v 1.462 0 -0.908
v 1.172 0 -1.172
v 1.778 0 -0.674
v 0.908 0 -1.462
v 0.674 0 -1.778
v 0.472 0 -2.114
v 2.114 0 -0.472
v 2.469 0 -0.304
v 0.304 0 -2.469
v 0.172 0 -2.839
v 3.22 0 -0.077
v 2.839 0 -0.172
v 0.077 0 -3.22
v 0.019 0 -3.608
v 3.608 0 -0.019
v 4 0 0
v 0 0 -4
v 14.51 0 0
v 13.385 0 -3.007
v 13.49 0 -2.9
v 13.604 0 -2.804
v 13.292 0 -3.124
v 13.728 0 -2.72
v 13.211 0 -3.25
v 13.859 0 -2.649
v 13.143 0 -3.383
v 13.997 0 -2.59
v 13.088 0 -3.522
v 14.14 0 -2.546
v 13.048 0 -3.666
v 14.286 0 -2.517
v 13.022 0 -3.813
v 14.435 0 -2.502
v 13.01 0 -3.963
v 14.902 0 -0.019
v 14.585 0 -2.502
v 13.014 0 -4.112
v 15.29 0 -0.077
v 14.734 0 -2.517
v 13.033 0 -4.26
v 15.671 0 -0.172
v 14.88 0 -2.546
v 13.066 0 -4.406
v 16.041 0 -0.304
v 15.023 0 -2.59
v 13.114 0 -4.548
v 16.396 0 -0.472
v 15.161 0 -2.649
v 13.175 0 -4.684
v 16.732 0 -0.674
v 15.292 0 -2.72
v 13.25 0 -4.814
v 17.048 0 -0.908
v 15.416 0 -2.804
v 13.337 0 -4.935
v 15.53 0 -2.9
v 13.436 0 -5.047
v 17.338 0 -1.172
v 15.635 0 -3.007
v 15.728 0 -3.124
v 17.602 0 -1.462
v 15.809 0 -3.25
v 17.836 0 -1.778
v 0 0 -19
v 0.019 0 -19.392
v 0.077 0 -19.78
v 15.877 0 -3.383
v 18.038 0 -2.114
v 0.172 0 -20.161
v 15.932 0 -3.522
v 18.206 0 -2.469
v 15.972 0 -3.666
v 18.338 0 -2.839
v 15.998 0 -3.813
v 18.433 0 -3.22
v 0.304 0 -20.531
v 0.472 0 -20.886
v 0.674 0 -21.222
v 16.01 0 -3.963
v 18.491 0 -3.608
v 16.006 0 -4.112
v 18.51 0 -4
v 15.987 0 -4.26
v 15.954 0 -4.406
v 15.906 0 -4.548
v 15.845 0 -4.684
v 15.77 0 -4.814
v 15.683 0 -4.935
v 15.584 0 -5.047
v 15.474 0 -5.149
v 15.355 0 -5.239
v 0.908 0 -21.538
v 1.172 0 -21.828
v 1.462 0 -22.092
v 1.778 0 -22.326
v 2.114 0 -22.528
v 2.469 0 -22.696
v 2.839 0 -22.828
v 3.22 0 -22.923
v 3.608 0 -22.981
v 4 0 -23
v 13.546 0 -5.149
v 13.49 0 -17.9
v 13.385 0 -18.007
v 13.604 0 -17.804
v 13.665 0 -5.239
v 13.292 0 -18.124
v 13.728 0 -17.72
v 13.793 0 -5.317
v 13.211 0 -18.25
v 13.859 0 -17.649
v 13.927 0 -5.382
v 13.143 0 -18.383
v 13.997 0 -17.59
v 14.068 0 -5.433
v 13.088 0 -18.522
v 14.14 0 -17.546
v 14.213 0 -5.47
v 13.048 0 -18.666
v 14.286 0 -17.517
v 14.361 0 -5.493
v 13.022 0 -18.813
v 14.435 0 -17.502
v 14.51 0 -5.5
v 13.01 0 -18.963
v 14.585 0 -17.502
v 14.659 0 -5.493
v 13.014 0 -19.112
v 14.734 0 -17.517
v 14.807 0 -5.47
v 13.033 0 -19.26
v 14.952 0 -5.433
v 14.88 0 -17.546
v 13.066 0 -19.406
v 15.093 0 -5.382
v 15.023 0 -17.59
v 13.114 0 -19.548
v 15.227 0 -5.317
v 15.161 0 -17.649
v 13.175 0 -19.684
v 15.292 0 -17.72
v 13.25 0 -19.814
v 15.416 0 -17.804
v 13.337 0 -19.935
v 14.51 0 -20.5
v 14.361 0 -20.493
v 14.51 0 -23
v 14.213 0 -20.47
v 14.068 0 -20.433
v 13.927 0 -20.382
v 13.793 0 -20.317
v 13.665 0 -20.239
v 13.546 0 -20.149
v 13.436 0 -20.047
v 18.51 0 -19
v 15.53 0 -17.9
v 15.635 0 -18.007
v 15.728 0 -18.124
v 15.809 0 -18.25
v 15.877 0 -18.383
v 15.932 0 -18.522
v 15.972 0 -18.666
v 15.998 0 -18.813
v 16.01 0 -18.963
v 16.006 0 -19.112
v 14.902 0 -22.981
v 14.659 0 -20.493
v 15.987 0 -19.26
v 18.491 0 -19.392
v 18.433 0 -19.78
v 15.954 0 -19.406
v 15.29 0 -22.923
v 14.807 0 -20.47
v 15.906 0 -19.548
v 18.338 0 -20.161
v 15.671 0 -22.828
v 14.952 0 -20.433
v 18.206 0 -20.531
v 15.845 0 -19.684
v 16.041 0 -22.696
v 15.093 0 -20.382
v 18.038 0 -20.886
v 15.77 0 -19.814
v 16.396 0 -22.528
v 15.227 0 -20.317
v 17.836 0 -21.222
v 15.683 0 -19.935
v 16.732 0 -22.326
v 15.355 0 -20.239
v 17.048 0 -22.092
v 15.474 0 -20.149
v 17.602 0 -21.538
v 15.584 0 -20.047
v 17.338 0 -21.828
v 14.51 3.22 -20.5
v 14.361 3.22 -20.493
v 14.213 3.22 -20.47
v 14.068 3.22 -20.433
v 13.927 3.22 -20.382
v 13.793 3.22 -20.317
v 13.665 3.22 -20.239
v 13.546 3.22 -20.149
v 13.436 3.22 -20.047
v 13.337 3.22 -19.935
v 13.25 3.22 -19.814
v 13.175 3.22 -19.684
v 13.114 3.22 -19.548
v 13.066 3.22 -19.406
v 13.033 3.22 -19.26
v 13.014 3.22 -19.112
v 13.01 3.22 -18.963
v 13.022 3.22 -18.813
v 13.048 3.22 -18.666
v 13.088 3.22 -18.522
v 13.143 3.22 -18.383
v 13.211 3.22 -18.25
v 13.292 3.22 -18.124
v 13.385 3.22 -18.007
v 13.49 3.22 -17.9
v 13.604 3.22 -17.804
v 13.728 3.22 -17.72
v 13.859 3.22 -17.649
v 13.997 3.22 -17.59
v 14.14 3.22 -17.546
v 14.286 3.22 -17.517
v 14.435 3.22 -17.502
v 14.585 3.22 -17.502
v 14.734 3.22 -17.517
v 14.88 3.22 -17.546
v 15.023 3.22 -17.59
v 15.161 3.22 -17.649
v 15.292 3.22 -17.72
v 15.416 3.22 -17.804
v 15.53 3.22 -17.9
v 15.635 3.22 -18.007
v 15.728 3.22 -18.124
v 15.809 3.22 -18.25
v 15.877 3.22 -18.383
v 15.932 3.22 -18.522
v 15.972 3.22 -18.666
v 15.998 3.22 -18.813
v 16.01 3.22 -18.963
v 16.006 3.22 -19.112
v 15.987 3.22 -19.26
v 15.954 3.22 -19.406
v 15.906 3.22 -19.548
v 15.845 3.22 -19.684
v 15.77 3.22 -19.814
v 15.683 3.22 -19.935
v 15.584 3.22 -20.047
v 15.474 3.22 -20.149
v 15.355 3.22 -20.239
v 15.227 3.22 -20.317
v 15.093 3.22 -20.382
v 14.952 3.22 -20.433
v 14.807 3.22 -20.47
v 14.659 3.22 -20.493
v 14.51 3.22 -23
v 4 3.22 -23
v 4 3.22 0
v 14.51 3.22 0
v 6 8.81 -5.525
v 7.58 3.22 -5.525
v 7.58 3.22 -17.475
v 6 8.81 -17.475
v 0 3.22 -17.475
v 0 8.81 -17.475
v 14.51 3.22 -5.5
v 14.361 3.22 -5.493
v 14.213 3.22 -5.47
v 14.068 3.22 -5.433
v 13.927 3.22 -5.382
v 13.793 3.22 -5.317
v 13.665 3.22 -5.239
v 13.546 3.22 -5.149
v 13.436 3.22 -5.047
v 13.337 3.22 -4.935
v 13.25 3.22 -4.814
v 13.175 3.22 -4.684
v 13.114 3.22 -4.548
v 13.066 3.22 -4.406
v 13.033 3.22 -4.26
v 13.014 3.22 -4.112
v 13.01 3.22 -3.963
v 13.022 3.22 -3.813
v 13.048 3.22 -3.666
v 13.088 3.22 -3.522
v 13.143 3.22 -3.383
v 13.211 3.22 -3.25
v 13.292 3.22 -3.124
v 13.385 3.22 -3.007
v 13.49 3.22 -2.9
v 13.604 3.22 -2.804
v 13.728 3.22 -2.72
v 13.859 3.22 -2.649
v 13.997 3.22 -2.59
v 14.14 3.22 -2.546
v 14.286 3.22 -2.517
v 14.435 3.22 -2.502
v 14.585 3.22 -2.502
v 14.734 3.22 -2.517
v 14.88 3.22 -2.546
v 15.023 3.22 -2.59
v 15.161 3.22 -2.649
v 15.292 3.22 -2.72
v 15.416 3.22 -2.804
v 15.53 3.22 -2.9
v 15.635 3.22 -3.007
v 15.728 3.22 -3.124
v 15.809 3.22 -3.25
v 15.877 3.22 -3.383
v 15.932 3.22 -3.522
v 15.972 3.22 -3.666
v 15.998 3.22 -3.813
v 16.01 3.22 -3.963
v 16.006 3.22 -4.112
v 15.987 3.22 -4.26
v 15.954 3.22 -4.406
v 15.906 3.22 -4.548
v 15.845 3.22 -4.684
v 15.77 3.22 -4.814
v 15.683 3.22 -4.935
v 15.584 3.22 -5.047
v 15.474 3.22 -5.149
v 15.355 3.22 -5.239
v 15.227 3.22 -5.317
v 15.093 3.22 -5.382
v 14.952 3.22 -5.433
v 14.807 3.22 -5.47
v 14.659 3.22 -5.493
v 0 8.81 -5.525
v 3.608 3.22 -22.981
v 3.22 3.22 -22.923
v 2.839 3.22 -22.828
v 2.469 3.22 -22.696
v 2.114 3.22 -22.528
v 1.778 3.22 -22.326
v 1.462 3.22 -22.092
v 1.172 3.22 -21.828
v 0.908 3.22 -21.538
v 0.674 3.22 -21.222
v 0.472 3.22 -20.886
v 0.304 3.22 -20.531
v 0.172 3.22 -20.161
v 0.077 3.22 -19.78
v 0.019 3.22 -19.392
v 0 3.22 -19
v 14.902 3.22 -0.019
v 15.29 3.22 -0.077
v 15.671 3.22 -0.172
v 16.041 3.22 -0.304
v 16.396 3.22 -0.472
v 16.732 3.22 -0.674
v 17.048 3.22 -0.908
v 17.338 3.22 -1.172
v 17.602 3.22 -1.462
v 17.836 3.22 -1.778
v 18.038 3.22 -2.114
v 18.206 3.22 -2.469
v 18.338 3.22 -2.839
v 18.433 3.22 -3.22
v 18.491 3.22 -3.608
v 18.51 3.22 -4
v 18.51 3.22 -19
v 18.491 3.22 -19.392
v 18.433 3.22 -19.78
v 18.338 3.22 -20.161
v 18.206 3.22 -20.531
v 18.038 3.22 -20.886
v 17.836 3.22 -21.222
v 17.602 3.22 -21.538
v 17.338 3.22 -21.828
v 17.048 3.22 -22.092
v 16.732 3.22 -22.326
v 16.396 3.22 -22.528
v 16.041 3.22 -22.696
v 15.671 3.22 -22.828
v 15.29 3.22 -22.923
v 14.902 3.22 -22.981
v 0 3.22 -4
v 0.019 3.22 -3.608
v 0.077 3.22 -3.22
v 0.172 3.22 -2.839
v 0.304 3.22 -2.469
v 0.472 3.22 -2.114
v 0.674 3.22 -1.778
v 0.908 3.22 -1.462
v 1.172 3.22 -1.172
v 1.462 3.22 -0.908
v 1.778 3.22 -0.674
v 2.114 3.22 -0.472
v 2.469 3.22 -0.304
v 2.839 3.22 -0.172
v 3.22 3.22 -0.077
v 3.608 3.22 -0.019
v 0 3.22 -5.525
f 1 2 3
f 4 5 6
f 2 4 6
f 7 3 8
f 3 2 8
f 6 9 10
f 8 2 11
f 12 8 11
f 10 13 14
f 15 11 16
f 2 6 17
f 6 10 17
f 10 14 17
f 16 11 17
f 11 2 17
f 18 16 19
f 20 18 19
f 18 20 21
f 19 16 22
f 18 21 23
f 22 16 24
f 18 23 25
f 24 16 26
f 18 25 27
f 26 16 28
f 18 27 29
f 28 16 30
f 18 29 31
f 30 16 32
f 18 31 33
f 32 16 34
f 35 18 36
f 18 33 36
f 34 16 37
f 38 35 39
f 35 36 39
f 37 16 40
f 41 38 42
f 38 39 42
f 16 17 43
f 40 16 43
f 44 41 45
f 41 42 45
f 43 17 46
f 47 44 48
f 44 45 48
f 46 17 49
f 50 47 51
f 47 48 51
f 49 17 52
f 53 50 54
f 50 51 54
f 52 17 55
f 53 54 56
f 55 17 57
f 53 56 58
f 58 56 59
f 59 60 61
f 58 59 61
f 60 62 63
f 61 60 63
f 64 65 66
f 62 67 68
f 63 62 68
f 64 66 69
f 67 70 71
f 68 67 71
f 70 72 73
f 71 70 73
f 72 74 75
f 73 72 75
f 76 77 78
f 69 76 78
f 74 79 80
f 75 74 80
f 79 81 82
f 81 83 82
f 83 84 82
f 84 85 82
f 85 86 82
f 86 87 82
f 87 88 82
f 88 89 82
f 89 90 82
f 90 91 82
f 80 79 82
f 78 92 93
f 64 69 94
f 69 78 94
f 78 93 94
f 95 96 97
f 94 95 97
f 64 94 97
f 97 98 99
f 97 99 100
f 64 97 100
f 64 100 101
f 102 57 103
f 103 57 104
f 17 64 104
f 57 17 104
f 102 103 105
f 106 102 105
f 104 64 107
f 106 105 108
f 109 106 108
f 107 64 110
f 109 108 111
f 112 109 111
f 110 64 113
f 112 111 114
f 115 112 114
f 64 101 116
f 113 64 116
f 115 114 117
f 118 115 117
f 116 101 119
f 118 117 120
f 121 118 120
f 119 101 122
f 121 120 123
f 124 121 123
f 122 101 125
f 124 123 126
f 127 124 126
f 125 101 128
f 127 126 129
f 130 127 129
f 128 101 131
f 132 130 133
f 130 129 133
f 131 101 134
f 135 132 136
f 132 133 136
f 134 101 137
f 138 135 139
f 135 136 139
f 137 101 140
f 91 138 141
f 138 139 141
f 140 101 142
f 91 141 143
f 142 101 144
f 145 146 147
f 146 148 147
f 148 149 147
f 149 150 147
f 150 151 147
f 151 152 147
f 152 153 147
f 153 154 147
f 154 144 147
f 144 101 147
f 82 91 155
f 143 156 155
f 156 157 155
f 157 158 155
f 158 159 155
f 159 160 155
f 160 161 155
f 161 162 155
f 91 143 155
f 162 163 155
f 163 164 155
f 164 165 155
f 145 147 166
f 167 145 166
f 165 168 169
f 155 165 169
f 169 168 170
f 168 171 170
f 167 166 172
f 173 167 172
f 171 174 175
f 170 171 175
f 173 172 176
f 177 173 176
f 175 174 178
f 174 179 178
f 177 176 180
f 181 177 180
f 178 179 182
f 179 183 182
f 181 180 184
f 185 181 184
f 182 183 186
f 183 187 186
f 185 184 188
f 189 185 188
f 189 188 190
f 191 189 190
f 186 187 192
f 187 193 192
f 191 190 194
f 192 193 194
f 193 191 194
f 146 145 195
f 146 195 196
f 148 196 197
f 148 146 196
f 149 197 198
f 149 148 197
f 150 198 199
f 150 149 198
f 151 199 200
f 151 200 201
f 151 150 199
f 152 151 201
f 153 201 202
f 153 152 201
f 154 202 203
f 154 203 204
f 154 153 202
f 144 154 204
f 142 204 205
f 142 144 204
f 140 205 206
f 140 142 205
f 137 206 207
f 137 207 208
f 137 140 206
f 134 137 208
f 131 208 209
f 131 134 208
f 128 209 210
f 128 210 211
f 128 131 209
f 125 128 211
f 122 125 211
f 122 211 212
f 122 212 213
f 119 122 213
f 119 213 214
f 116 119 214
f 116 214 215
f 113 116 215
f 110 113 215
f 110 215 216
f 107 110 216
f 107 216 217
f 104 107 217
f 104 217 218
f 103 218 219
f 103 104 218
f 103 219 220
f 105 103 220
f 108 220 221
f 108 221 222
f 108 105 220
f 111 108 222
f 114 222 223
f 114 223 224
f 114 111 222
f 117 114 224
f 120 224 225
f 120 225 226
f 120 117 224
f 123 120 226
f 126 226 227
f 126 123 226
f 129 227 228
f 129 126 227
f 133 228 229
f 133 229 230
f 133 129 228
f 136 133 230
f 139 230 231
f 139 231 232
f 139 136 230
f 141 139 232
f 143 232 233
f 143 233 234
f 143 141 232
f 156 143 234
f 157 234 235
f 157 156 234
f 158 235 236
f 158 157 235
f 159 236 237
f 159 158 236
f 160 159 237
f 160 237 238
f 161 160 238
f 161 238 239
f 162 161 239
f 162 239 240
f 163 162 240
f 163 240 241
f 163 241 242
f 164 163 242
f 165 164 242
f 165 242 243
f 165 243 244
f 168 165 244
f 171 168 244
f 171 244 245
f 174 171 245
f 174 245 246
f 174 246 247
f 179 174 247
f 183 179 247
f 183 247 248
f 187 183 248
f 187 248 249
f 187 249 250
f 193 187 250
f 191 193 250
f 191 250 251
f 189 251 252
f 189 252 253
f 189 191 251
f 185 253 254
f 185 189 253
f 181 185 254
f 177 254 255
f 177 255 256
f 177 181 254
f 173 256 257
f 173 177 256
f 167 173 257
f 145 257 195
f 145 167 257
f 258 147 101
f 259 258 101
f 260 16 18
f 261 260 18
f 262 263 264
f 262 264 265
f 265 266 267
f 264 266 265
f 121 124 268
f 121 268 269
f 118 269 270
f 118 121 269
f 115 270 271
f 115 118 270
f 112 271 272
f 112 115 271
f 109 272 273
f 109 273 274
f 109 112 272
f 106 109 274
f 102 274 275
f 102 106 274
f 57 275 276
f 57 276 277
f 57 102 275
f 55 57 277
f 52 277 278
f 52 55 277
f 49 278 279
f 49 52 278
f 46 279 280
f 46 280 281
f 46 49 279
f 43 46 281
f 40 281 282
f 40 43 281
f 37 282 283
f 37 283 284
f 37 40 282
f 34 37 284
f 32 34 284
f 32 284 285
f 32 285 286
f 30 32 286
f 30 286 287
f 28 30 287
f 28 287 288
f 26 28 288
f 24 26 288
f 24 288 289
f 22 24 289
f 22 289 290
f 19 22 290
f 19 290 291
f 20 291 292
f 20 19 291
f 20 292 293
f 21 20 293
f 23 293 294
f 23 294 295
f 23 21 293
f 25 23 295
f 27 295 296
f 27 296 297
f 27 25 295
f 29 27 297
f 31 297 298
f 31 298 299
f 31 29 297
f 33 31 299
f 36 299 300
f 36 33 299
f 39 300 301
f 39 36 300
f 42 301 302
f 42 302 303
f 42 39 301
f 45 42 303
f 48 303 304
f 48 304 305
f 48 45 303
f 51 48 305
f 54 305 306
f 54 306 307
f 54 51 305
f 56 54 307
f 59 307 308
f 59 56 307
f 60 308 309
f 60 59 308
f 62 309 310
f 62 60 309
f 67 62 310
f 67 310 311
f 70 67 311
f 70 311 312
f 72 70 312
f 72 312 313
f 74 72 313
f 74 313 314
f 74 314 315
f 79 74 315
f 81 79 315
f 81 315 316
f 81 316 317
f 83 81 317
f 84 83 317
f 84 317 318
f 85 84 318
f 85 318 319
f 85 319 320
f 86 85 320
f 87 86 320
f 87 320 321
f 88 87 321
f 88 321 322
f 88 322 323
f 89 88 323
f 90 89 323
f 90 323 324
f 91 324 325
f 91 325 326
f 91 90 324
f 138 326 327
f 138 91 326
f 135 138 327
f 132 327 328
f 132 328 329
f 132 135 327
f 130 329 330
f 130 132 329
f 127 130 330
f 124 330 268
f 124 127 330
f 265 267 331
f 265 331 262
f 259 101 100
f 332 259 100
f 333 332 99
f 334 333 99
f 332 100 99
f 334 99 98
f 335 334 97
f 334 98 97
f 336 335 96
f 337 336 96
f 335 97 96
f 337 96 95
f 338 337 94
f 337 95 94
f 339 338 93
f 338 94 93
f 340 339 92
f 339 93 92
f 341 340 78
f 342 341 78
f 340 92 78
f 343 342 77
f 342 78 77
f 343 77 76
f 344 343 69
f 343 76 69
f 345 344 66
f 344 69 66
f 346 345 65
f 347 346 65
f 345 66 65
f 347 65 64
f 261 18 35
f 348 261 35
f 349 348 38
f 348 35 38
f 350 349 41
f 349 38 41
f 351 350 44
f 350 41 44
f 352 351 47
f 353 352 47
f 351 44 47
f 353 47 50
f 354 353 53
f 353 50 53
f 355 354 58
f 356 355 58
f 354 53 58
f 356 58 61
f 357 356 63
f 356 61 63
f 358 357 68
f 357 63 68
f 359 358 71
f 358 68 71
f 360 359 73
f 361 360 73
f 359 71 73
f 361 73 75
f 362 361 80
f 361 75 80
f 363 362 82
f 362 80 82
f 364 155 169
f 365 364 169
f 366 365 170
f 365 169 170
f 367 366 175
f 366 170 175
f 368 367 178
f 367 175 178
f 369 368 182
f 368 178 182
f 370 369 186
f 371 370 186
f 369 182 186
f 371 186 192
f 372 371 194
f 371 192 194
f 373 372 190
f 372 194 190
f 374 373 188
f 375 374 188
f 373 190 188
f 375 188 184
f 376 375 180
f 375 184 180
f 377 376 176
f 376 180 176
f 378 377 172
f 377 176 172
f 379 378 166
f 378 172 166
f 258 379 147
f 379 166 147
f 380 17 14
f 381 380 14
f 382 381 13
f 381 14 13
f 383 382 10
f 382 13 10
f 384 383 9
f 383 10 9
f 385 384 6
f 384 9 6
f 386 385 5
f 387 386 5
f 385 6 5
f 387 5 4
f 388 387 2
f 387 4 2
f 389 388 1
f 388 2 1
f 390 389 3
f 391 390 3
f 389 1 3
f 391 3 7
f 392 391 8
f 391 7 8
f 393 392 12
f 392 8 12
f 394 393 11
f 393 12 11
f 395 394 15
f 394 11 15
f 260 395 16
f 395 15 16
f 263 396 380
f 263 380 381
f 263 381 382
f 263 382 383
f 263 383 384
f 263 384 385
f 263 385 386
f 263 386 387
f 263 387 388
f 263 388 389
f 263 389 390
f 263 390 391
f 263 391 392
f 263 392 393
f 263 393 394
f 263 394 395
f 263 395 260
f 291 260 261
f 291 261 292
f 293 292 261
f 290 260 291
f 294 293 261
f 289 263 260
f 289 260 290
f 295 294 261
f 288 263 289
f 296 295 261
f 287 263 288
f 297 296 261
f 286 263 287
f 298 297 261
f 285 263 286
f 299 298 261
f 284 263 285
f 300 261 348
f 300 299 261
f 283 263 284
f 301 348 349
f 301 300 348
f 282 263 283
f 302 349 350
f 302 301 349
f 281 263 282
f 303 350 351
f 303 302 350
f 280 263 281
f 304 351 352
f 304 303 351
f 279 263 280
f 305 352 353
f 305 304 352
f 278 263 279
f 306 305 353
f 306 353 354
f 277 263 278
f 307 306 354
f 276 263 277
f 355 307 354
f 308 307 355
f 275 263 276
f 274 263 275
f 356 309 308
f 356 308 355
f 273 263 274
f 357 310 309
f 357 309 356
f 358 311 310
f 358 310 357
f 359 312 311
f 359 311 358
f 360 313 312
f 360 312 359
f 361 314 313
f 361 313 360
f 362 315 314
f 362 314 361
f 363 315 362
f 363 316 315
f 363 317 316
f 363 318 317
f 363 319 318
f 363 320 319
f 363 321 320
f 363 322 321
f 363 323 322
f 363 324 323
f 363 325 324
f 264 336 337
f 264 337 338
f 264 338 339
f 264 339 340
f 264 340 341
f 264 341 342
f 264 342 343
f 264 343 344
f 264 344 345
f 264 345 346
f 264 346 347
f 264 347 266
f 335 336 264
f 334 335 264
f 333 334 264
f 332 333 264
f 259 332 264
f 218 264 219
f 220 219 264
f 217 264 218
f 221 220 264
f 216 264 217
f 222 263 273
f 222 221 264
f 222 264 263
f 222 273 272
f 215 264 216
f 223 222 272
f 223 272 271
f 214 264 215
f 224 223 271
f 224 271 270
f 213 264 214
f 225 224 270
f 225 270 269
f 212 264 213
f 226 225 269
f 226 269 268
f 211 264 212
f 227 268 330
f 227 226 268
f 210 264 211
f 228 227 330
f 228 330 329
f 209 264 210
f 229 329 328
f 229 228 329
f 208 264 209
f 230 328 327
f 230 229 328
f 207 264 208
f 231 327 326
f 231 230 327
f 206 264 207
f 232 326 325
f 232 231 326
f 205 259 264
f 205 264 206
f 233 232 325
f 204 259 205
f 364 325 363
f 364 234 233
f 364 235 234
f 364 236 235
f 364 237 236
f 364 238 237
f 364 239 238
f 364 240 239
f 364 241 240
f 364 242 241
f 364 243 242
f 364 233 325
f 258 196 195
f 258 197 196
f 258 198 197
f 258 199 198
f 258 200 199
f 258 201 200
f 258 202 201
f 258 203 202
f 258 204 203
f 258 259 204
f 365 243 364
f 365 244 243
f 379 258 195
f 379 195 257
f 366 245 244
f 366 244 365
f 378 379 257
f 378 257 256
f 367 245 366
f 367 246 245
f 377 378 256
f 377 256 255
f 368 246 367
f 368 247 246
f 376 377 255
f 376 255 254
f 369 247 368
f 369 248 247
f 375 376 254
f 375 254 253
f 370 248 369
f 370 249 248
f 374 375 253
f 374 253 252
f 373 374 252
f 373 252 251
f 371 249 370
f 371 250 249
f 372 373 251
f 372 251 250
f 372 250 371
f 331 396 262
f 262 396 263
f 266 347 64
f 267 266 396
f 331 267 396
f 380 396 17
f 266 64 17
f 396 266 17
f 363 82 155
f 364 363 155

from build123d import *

# Parameters (mm, degrees)
SKETCH1_R           = 1.5
BOSS_EXTRUDE1_DEPTH = 3.22
SKETCH3_W           = 6
SKETCH3_H           = 11.95
BOSS_EXTRUDE2_DEPTH = 5.59
BOSS_EXTRUDE3_DEPTH = 11.95


with BuildPart() as part:
    # Sketch1 → Boss-Extrude1 (new body)
    with BuildSketch(Plane(origin=(0, 0, 0), x_dir=(1, 0, 0), z_dir=(0, 1, 0))):
        with BuildLine():
            Line((4, 0), (14.51, 0))
            ThreePointArc((14.51, 0), (17.338427125, 1.171572875), (18.51, 4))
            Line((18.51, 4), (18.51, 19))
            ThreePointArc((18.51, 19), (17.338427125, 21.828427125), (14.51, 23))
            Line((14.51, 23), (4, 23))
            ThreePointArc((4, 23), (1.171572875, 21.828427125), (0, 19))
            Line((0, 19), (0, 4))
            ThreePointArc((0, 4), (1.171572875, 1.171572875), (4, 0))
        make_face()
        with Locations(Location((14.51, 19, 0), (0, 0, 90))):
            Circle(SKETCH1_R, mode=Mode.SUBTRACT)
        with Locations(Location((14.51, 4, 0), (0, 0, 90))):
            Circle(SKETCH1_R, mode=Mode.SUBTRACT)
    extrude(amount=BOSS_EXTRUDE1_DEPTH)

    # Sketch3 → Boss-Extrude2 (add)
    with BuildSketch(Plane(origin=(0, 3.22, 0), x_dir=(1, 0, 0), z_dir=(0, 1, 0))):
        with Locations((3, 11.5)):
            Rectangle(SKETCH3_W, SKETCH3_H)
    extrude(amount=BOSS_EXTRUDE2_DEPTH)

    # Sketch4 → Boss-Extrude3 (add)
    with BuildSketch(Plane.XY.offset(-5.525)):
        Polygon((0, 3.22), (7.58, 3.22), (6, 8.81), (0, 8.81), align=None)
    extrude(amount=-BOSS_EXTRUDE3_DEPTH)


solid = part.part
